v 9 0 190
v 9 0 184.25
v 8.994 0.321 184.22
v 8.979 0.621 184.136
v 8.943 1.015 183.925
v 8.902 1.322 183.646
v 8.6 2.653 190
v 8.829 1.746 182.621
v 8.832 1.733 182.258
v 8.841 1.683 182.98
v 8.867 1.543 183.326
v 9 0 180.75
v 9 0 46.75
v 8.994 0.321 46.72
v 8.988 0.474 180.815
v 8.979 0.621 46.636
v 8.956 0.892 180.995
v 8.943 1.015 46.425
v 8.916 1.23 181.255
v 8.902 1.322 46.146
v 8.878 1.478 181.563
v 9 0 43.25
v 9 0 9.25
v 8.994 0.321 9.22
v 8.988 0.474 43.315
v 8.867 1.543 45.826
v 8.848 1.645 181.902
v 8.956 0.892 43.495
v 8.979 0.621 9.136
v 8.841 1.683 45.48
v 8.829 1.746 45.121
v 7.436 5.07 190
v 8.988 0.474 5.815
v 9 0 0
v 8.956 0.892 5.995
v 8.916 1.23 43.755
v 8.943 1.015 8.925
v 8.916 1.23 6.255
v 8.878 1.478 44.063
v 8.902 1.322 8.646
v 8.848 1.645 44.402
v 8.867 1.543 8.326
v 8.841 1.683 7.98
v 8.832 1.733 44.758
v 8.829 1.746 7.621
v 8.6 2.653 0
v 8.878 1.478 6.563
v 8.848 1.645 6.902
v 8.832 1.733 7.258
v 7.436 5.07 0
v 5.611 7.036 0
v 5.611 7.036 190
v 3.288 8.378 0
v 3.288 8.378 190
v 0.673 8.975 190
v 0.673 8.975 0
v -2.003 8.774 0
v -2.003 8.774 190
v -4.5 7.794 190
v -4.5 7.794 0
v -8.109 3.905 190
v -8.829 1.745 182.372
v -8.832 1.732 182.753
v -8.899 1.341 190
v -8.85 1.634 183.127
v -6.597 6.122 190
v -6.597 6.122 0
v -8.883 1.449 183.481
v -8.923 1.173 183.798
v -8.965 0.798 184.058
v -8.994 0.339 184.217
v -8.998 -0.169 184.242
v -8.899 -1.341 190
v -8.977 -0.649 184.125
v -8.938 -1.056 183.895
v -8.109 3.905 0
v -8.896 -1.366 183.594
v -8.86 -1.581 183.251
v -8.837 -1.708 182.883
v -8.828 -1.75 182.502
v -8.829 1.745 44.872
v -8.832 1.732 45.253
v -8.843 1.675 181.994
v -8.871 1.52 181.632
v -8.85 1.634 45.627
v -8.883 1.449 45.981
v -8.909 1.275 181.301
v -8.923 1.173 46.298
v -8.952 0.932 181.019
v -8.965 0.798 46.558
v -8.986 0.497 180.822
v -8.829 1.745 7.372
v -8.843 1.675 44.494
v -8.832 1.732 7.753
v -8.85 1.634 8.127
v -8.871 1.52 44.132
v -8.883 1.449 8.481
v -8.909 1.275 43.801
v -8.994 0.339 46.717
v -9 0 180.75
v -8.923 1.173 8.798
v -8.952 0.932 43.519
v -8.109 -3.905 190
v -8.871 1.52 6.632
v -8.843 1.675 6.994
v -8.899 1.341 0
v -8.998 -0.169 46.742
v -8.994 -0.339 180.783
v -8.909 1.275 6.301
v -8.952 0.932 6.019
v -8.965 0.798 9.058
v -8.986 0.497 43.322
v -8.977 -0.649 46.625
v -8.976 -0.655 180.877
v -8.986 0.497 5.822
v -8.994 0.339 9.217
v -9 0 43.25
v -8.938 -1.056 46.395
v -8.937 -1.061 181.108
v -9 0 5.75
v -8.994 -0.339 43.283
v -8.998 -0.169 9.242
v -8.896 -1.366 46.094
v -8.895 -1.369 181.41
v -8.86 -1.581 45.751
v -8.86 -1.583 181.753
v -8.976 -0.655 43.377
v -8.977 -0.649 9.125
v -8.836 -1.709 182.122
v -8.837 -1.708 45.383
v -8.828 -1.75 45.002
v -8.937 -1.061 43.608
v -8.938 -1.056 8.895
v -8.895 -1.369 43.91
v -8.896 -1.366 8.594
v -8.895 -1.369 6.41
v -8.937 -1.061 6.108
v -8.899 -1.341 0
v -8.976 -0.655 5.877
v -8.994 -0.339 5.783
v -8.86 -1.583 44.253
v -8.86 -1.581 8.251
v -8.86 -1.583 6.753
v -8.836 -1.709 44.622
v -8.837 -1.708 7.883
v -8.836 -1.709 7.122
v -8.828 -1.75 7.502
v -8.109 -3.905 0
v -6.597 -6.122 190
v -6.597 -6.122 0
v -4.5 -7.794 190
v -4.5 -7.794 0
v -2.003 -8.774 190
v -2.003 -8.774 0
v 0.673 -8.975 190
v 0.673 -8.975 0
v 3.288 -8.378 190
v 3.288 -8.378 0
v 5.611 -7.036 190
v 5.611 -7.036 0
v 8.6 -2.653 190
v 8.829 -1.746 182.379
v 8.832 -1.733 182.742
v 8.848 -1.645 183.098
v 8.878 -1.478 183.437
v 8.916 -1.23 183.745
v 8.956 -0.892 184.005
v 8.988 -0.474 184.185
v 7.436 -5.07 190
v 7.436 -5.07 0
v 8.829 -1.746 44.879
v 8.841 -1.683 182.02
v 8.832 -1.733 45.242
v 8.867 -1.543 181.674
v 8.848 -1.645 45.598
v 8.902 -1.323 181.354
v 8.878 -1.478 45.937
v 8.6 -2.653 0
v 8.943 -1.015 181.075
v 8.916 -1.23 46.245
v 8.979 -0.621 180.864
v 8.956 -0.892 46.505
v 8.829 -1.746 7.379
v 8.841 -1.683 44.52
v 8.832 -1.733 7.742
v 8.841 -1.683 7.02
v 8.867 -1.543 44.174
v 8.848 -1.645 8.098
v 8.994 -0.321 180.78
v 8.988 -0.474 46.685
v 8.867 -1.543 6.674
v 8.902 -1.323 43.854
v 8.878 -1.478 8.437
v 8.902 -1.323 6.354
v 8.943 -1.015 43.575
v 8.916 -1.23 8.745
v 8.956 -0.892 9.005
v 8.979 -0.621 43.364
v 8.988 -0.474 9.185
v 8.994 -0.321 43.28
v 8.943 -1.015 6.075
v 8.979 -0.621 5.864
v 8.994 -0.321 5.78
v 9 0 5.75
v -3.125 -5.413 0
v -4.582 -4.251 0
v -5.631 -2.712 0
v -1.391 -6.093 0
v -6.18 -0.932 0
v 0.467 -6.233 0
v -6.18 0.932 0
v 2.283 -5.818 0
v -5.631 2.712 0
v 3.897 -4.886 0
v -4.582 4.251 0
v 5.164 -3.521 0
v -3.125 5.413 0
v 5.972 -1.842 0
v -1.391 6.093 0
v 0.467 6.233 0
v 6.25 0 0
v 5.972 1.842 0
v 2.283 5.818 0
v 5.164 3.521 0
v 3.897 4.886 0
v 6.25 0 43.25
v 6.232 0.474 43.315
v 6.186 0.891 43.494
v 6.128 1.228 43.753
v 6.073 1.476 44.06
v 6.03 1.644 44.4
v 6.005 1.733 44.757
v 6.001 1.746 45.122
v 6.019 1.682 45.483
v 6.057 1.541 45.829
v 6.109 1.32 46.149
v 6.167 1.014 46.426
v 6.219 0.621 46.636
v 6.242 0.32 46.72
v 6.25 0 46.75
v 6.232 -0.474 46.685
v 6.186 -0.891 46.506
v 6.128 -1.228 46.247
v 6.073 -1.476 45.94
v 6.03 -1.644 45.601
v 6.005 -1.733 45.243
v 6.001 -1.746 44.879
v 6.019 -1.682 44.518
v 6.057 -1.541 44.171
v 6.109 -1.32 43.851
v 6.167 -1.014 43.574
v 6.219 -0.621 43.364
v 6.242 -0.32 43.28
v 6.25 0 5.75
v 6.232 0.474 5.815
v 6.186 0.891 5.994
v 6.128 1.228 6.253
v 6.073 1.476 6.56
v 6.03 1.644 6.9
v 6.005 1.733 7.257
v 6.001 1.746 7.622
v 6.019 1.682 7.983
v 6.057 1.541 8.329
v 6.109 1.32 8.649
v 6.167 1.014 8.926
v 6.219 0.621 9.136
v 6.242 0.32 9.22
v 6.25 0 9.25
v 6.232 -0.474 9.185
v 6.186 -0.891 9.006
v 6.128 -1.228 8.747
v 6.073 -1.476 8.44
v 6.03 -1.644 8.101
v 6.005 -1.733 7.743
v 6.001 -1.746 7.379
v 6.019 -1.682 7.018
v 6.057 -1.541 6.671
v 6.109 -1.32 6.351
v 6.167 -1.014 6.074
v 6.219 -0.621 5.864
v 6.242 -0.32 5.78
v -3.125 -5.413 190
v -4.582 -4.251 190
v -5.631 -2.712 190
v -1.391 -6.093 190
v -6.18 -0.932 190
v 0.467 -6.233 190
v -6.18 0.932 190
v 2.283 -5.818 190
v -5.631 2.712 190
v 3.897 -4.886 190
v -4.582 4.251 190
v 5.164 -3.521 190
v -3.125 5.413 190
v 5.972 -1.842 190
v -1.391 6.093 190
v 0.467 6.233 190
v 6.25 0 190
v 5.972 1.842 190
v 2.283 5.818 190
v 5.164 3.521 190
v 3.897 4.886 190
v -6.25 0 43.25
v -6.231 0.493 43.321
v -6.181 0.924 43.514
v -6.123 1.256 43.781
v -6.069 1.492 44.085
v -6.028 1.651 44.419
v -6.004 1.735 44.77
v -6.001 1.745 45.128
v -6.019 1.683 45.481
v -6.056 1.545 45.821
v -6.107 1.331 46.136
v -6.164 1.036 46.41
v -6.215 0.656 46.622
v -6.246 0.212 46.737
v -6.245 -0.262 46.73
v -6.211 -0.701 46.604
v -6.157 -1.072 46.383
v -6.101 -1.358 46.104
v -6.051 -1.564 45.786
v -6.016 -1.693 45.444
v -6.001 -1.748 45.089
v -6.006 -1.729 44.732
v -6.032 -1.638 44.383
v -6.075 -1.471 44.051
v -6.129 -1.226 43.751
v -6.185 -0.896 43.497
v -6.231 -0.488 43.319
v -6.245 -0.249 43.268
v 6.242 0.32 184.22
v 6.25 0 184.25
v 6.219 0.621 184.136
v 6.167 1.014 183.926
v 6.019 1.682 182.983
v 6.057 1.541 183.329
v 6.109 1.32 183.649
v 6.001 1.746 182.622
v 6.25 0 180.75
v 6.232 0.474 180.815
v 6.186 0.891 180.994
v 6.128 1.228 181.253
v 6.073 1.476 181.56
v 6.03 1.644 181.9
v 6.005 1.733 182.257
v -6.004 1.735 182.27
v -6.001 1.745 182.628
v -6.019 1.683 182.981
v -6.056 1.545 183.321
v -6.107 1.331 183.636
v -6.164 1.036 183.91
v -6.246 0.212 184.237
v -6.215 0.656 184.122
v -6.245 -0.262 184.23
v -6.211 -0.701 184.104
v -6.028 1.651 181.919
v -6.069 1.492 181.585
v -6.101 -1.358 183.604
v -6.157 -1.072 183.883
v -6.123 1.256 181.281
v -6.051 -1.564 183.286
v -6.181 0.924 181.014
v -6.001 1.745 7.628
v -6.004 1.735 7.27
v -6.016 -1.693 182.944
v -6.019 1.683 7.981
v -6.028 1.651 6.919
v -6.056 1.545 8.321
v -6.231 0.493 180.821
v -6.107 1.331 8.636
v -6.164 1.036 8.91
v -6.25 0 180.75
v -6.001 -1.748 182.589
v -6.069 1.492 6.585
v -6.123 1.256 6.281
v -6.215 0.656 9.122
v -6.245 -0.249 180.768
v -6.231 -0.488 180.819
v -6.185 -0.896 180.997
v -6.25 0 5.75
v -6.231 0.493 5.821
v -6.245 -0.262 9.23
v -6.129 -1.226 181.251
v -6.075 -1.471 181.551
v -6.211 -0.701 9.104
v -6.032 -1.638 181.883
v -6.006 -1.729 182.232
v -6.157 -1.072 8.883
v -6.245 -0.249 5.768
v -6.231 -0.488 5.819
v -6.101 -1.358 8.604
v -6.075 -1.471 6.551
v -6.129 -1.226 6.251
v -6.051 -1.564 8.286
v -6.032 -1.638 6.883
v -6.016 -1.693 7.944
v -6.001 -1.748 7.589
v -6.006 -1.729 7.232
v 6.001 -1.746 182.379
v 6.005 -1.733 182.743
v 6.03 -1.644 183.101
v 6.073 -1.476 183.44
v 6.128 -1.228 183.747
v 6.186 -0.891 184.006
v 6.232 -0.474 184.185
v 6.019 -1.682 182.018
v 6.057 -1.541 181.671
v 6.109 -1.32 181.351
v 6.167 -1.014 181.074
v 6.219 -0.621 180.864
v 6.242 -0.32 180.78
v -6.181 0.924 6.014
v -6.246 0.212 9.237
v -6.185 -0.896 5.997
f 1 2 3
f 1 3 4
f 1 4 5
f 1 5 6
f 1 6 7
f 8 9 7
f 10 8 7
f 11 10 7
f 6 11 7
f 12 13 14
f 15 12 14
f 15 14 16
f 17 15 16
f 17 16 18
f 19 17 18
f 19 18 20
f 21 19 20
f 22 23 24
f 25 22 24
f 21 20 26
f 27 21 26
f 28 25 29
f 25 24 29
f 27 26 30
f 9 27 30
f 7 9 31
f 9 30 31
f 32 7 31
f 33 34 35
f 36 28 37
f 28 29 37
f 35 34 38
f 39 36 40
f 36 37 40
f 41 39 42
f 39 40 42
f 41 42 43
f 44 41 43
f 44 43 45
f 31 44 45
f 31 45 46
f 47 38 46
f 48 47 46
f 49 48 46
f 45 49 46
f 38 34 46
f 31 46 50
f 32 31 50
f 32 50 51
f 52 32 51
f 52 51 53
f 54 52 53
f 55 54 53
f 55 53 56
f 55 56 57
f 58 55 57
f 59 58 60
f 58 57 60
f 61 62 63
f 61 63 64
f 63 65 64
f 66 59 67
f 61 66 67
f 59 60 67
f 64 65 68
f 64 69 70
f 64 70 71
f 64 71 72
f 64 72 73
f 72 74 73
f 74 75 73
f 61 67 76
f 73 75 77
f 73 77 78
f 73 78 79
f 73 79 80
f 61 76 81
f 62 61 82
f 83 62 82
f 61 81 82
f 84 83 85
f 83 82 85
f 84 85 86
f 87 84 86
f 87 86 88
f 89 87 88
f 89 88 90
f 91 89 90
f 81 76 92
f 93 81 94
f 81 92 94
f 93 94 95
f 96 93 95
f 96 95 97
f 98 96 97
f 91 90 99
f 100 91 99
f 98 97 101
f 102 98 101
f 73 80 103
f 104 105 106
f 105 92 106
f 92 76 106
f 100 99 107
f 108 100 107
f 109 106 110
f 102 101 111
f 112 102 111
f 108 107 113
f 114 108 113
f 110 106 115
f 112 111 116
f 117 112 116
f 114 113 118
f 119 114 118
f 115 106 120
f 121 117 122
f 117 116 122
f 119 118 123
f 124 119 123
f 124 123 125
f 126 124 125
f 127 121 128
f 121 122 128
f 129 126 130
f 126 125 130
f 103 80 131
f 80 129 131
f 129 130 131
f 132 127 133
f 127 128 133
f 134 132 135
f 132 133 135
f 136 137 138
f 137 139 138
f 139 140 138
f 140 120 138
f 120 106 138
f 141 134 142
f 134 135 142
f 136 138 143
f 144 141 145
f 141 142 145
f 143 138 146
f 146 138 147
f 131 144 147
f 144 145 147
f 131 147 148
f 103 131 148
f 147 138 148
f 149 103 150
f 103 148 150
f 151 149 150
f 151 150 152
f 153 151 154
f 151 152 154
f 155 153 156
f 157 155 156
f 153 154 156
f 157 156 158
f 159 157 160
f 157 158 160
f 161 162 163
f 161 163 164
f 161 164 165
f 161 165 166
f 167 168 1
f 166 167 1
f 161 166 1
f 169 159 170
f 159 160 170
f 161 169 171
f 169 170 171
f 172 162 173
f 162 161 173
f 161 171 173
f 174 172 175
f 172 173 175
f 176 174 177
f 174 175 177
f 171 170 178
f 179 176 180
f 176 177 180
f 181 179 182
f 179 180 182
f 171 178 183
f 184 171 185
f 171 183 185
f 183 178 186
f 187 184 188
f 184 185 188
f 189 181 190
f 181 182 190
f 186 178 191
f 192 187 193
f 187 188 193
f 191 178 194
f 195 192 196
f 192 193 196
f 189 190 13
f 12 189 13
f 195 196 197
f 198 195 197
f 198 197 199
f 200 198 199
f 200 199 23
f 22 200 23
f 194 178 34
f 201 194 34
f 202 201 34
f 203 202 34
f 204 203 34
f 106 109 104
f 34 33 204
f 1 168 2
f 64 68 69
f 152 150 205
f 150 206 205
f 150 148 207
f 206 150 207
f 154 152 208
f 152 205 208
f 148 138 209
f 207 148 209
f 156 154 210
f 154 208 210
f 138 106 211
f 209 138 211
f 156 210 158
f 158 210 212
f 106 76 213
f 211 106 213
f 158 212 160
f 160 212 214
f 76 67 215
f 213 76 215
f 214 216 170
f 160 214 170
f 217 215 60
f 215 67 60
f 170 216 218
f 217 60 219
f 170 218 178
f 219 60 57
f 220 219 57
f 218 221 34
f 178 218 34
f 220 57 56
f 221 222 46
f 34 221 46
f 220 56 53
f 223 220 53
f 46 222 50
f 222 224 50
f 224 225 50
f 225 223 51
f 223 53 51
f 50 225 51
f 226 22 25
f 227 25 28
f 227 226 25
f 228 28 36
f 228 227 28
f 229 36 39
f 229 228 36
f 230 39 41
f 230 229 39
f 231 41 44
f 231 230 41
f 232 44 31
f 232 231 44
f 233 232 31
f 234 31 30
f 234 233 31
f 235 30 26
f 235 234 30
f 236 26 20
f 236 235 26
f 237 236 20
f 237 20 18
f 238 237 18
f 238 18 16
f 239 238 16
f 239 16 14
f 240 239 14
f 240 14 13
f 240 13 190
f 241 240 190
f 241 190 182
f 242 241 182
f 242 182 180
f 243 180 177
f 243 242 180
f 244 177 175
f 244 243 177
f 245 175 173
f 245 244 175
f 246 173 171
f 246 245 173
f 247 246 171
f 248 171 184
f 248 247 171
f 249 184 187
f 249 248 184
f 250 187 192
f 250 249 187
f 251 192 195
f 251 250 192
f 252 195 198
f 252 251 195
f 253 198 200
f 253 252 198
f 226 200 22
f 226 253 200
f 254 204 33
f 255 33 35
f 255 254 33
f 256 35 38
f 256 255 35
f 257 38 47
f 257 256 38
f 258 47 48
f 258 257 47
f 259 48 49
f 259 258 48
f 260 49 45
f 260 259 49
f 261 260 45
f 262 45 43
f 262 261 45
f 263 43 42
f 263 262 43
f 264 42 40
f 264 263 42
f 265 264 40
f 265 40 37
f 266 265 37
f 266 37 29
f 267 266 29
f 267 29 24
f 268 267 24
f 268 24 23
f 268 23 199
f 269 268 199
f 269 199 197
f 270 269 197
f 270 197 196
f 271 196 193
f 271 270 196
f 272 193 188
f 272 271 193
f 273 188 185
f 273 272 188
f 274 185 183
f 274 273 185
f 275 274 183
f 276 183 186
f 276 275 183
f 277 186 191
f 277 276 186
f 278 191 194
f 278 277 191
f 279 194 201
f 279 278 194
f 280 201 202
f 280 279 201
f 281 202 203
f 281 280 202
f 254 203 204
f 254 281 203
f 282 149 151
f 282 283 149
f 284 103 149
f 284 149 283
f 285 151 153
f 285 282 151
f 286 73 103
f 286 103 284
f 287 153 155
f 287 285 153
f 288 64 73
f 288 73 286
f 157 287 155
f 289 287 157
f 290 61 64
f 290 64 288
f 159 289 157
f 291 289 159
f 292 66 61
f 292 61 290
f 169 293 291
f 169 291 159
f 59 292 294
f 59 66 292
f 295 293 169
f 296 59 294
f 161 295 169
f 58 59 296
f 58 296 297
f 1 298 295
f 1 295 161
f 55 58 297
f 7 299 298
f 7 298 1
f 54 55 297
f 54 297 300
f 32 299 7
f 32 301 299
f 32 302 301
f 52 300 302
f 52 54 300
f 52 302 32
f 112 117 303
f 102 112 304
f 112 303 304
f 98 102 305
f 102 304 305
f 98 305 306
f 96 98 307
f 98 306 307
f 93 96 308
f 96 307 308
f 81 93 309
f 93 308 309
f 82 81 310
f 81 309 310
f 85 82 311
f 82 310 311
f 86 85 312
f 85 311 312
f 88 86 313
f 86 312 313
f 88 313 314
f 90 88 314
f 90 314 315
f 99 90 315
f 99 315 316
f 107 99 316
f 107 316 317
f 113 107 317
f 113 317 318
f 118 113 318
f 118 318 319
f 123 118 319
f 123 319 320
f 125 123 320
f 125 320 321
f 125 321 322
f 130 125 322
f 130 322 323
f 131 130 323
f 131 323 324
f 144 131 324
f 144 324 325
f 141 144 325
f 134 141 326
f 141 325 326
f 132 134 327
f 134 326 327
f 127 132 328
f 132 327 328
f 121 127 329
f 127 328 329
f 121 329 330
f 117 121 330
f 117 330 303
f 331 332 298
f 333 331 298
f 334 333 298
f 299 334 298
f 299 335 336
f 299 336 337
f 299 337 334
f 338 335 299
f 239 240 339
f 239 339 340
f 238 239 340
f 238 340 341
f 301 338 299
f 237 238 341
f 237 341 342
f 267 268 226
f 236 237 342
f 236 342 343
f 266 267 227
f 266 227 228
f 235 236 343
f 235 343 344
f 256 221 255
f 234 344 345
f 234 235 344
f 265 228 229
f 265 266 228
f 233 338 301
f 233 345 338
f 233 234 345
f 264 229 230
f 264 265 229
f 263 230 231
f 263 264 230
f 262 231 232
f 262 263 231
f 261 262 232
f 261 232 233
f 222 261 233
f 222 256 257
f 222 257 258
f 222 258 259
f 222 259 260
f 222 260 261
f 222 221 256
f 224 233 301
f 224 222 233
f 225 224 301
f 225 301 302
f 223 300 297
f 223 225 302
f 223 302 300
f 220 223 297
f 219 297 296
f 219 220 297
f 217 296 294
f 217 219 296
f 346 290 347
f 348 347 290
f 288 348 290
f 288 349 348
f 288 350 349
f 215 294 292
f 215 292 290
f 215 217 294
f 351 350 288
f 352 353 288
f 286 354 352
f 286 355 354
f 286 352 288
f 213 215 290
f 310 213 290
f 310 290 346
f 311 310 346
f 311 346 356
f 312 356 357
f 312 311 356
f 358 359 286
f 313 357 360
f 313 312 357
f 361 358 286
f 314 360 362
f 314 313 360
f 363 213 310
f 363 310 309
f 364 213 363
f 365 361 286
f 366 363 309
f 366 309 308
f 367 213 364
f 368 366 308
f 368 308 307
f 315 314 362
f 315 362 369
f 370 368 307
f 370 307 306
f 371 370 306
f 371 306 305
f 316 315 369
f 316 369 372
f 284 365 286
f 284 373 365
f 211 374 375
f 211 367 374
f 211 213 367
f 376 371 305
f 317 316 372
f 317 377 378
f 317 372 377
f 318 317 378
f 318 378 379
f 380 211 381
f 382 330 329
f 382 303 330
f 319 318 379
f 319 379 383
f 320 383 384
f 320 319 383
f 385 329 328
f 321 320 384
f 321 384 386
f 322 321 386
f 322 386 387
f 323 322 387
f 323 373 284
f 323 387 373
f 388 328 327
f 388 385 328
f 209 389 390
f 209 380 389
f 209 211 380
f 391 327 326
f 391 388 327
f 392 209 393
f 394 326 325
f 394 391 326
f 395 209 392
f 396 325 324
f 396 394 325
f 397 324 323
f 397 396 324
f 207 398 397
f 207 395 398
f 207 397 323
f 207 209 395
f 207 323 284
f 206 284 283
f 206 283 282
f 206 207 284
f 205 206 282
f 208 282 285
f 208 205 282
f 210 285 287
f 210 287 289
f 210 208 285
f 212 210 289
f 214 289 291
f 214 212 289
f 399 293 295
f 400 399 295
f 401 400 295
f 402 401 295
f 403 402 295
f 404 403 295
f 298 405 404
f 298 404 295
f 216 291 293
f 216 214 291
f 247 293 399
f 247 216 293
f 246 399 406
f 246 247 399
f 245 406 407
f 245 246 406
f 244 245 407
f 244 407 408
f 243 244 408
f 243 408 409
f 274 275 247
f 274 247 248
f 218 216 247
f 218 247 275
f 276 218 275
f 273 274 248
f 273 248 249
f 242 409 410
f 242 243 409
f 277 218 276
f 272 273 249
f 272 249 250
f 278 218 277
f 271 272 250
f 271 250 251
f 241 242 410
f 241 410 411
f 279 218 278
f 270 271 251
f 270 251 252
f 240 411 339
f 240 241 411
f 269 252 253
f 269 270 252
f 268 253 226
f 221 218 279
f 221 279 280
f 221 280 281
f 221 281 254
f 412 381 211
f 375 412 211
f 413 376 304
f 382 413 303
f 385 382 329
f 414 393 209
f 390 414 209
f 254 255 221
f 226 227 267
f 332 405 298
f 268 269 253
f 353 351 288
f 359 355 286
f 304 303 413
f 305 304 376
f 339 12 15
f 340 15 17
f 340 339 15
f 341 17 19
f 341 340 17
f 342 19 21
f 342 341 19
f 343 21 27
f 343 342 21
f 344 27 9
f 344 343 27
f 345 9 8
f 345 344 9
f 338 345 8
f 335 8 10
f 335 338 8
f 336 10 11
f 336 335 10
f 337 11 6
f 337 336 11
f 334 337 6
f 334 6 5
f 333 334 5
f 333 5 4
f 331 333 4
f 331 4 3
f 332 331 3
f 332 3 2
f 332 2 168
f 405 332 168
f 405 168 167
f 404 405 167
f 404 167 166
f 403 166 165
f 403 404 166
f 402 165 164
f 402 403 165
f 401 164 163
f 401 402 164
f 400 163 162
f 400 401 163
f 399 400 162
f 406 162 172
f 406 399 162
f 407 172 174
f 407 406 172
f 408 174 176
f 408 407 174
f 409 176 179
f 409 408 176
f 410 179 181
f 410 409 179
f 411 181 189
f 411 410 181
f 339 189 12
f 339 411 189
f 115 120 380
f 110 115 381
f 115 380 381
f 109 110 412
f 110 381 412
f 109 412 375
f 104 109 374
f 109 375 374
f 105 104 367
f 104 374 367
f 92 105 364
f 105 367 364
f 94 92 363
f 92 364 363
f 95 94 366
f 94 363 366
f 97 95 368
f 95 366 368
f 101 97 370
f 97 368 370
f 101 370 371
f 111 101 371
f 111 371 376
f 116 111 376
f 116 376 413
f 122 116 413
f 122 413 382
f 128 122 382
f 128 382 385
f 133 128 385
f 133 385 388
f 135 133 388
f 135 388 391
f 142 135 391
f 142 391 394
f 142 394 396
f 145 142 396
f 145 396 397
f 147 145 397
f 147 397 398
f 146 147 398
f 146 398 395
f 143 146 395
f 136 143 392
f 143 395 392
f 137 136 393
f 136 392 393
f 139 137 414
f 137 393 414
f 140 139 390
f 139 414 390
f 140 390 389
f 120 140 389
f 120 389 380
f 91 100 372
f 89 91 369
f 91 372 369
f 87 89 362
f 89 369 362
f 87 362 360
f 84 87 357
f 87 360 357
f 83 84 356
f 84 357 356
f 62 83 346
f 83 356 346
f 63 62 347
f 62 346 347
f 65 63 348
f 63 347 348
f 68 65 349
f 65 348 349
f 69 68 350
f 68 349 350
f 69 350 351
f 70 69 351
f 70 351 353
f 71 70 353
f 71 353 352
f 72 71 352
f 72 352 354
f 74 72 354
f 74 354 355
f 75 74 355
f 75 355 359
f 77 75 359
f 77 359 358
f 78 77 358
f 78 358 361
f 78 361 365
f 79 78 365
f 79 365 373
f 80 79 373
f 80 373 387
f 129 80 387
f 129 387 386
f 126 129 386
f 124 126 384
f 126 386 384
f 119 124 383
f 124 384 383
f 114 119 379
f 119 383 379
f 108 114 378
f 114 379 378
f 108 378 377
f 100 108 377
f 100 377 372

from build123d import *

# Parameters (mm, degrees)
SKETCH_1_R               = 9
SKETCH_1_R_2             = 6.25
EXTRUDE_1_DEPTH          = 190
SKETCH_2_R               = 1.75
CUT_EXTRUDE_1_DEPTH      = 10
CUT_EXTRUDE_1_DEPTH_BACK = 10


with BuildPart() as part:
    # ｽｹｯﾁ1 → ﾎﾞｽ - 押し出し1 (new body)
    with BuildSketch(Plane.XY):
        Circle(SKETCH_1_R)
        Circle(SKETCH_1_R_2, mode=Mode.SUBTRACT)
    extrude(amount=EXTRUDE_1_DEPTH)

    # ｽｹｯﾁ2 → ｶｯﾄ - 押し出し1 (cut, two sides)
    with BuildSketch(Plane(origin=(0, 0, 0), x_dir=(0, 0, -1), z_dir=(1, 0, 0))) as cut_extrude_1_sk:
        with Locations((-7.5, 0)):
            Circle(SKETCH_2_R)
        with Locations((-182.5, 0)):
            Circle(SKETCH_2_R)
        with Locations((-45, 0)):
            Circle(SKETCH_2_R)
    extrude(amount=CUT_EXTRUDE_1_DEPTH, mode=Mode.SUBTRACT)
    extrude(cut_extrude_1_sk.sketch, amount=-CUT_EXTRUDE_1_DEPTH_BACK, mode=Mode.SUBTRACT)


solid = part.part
